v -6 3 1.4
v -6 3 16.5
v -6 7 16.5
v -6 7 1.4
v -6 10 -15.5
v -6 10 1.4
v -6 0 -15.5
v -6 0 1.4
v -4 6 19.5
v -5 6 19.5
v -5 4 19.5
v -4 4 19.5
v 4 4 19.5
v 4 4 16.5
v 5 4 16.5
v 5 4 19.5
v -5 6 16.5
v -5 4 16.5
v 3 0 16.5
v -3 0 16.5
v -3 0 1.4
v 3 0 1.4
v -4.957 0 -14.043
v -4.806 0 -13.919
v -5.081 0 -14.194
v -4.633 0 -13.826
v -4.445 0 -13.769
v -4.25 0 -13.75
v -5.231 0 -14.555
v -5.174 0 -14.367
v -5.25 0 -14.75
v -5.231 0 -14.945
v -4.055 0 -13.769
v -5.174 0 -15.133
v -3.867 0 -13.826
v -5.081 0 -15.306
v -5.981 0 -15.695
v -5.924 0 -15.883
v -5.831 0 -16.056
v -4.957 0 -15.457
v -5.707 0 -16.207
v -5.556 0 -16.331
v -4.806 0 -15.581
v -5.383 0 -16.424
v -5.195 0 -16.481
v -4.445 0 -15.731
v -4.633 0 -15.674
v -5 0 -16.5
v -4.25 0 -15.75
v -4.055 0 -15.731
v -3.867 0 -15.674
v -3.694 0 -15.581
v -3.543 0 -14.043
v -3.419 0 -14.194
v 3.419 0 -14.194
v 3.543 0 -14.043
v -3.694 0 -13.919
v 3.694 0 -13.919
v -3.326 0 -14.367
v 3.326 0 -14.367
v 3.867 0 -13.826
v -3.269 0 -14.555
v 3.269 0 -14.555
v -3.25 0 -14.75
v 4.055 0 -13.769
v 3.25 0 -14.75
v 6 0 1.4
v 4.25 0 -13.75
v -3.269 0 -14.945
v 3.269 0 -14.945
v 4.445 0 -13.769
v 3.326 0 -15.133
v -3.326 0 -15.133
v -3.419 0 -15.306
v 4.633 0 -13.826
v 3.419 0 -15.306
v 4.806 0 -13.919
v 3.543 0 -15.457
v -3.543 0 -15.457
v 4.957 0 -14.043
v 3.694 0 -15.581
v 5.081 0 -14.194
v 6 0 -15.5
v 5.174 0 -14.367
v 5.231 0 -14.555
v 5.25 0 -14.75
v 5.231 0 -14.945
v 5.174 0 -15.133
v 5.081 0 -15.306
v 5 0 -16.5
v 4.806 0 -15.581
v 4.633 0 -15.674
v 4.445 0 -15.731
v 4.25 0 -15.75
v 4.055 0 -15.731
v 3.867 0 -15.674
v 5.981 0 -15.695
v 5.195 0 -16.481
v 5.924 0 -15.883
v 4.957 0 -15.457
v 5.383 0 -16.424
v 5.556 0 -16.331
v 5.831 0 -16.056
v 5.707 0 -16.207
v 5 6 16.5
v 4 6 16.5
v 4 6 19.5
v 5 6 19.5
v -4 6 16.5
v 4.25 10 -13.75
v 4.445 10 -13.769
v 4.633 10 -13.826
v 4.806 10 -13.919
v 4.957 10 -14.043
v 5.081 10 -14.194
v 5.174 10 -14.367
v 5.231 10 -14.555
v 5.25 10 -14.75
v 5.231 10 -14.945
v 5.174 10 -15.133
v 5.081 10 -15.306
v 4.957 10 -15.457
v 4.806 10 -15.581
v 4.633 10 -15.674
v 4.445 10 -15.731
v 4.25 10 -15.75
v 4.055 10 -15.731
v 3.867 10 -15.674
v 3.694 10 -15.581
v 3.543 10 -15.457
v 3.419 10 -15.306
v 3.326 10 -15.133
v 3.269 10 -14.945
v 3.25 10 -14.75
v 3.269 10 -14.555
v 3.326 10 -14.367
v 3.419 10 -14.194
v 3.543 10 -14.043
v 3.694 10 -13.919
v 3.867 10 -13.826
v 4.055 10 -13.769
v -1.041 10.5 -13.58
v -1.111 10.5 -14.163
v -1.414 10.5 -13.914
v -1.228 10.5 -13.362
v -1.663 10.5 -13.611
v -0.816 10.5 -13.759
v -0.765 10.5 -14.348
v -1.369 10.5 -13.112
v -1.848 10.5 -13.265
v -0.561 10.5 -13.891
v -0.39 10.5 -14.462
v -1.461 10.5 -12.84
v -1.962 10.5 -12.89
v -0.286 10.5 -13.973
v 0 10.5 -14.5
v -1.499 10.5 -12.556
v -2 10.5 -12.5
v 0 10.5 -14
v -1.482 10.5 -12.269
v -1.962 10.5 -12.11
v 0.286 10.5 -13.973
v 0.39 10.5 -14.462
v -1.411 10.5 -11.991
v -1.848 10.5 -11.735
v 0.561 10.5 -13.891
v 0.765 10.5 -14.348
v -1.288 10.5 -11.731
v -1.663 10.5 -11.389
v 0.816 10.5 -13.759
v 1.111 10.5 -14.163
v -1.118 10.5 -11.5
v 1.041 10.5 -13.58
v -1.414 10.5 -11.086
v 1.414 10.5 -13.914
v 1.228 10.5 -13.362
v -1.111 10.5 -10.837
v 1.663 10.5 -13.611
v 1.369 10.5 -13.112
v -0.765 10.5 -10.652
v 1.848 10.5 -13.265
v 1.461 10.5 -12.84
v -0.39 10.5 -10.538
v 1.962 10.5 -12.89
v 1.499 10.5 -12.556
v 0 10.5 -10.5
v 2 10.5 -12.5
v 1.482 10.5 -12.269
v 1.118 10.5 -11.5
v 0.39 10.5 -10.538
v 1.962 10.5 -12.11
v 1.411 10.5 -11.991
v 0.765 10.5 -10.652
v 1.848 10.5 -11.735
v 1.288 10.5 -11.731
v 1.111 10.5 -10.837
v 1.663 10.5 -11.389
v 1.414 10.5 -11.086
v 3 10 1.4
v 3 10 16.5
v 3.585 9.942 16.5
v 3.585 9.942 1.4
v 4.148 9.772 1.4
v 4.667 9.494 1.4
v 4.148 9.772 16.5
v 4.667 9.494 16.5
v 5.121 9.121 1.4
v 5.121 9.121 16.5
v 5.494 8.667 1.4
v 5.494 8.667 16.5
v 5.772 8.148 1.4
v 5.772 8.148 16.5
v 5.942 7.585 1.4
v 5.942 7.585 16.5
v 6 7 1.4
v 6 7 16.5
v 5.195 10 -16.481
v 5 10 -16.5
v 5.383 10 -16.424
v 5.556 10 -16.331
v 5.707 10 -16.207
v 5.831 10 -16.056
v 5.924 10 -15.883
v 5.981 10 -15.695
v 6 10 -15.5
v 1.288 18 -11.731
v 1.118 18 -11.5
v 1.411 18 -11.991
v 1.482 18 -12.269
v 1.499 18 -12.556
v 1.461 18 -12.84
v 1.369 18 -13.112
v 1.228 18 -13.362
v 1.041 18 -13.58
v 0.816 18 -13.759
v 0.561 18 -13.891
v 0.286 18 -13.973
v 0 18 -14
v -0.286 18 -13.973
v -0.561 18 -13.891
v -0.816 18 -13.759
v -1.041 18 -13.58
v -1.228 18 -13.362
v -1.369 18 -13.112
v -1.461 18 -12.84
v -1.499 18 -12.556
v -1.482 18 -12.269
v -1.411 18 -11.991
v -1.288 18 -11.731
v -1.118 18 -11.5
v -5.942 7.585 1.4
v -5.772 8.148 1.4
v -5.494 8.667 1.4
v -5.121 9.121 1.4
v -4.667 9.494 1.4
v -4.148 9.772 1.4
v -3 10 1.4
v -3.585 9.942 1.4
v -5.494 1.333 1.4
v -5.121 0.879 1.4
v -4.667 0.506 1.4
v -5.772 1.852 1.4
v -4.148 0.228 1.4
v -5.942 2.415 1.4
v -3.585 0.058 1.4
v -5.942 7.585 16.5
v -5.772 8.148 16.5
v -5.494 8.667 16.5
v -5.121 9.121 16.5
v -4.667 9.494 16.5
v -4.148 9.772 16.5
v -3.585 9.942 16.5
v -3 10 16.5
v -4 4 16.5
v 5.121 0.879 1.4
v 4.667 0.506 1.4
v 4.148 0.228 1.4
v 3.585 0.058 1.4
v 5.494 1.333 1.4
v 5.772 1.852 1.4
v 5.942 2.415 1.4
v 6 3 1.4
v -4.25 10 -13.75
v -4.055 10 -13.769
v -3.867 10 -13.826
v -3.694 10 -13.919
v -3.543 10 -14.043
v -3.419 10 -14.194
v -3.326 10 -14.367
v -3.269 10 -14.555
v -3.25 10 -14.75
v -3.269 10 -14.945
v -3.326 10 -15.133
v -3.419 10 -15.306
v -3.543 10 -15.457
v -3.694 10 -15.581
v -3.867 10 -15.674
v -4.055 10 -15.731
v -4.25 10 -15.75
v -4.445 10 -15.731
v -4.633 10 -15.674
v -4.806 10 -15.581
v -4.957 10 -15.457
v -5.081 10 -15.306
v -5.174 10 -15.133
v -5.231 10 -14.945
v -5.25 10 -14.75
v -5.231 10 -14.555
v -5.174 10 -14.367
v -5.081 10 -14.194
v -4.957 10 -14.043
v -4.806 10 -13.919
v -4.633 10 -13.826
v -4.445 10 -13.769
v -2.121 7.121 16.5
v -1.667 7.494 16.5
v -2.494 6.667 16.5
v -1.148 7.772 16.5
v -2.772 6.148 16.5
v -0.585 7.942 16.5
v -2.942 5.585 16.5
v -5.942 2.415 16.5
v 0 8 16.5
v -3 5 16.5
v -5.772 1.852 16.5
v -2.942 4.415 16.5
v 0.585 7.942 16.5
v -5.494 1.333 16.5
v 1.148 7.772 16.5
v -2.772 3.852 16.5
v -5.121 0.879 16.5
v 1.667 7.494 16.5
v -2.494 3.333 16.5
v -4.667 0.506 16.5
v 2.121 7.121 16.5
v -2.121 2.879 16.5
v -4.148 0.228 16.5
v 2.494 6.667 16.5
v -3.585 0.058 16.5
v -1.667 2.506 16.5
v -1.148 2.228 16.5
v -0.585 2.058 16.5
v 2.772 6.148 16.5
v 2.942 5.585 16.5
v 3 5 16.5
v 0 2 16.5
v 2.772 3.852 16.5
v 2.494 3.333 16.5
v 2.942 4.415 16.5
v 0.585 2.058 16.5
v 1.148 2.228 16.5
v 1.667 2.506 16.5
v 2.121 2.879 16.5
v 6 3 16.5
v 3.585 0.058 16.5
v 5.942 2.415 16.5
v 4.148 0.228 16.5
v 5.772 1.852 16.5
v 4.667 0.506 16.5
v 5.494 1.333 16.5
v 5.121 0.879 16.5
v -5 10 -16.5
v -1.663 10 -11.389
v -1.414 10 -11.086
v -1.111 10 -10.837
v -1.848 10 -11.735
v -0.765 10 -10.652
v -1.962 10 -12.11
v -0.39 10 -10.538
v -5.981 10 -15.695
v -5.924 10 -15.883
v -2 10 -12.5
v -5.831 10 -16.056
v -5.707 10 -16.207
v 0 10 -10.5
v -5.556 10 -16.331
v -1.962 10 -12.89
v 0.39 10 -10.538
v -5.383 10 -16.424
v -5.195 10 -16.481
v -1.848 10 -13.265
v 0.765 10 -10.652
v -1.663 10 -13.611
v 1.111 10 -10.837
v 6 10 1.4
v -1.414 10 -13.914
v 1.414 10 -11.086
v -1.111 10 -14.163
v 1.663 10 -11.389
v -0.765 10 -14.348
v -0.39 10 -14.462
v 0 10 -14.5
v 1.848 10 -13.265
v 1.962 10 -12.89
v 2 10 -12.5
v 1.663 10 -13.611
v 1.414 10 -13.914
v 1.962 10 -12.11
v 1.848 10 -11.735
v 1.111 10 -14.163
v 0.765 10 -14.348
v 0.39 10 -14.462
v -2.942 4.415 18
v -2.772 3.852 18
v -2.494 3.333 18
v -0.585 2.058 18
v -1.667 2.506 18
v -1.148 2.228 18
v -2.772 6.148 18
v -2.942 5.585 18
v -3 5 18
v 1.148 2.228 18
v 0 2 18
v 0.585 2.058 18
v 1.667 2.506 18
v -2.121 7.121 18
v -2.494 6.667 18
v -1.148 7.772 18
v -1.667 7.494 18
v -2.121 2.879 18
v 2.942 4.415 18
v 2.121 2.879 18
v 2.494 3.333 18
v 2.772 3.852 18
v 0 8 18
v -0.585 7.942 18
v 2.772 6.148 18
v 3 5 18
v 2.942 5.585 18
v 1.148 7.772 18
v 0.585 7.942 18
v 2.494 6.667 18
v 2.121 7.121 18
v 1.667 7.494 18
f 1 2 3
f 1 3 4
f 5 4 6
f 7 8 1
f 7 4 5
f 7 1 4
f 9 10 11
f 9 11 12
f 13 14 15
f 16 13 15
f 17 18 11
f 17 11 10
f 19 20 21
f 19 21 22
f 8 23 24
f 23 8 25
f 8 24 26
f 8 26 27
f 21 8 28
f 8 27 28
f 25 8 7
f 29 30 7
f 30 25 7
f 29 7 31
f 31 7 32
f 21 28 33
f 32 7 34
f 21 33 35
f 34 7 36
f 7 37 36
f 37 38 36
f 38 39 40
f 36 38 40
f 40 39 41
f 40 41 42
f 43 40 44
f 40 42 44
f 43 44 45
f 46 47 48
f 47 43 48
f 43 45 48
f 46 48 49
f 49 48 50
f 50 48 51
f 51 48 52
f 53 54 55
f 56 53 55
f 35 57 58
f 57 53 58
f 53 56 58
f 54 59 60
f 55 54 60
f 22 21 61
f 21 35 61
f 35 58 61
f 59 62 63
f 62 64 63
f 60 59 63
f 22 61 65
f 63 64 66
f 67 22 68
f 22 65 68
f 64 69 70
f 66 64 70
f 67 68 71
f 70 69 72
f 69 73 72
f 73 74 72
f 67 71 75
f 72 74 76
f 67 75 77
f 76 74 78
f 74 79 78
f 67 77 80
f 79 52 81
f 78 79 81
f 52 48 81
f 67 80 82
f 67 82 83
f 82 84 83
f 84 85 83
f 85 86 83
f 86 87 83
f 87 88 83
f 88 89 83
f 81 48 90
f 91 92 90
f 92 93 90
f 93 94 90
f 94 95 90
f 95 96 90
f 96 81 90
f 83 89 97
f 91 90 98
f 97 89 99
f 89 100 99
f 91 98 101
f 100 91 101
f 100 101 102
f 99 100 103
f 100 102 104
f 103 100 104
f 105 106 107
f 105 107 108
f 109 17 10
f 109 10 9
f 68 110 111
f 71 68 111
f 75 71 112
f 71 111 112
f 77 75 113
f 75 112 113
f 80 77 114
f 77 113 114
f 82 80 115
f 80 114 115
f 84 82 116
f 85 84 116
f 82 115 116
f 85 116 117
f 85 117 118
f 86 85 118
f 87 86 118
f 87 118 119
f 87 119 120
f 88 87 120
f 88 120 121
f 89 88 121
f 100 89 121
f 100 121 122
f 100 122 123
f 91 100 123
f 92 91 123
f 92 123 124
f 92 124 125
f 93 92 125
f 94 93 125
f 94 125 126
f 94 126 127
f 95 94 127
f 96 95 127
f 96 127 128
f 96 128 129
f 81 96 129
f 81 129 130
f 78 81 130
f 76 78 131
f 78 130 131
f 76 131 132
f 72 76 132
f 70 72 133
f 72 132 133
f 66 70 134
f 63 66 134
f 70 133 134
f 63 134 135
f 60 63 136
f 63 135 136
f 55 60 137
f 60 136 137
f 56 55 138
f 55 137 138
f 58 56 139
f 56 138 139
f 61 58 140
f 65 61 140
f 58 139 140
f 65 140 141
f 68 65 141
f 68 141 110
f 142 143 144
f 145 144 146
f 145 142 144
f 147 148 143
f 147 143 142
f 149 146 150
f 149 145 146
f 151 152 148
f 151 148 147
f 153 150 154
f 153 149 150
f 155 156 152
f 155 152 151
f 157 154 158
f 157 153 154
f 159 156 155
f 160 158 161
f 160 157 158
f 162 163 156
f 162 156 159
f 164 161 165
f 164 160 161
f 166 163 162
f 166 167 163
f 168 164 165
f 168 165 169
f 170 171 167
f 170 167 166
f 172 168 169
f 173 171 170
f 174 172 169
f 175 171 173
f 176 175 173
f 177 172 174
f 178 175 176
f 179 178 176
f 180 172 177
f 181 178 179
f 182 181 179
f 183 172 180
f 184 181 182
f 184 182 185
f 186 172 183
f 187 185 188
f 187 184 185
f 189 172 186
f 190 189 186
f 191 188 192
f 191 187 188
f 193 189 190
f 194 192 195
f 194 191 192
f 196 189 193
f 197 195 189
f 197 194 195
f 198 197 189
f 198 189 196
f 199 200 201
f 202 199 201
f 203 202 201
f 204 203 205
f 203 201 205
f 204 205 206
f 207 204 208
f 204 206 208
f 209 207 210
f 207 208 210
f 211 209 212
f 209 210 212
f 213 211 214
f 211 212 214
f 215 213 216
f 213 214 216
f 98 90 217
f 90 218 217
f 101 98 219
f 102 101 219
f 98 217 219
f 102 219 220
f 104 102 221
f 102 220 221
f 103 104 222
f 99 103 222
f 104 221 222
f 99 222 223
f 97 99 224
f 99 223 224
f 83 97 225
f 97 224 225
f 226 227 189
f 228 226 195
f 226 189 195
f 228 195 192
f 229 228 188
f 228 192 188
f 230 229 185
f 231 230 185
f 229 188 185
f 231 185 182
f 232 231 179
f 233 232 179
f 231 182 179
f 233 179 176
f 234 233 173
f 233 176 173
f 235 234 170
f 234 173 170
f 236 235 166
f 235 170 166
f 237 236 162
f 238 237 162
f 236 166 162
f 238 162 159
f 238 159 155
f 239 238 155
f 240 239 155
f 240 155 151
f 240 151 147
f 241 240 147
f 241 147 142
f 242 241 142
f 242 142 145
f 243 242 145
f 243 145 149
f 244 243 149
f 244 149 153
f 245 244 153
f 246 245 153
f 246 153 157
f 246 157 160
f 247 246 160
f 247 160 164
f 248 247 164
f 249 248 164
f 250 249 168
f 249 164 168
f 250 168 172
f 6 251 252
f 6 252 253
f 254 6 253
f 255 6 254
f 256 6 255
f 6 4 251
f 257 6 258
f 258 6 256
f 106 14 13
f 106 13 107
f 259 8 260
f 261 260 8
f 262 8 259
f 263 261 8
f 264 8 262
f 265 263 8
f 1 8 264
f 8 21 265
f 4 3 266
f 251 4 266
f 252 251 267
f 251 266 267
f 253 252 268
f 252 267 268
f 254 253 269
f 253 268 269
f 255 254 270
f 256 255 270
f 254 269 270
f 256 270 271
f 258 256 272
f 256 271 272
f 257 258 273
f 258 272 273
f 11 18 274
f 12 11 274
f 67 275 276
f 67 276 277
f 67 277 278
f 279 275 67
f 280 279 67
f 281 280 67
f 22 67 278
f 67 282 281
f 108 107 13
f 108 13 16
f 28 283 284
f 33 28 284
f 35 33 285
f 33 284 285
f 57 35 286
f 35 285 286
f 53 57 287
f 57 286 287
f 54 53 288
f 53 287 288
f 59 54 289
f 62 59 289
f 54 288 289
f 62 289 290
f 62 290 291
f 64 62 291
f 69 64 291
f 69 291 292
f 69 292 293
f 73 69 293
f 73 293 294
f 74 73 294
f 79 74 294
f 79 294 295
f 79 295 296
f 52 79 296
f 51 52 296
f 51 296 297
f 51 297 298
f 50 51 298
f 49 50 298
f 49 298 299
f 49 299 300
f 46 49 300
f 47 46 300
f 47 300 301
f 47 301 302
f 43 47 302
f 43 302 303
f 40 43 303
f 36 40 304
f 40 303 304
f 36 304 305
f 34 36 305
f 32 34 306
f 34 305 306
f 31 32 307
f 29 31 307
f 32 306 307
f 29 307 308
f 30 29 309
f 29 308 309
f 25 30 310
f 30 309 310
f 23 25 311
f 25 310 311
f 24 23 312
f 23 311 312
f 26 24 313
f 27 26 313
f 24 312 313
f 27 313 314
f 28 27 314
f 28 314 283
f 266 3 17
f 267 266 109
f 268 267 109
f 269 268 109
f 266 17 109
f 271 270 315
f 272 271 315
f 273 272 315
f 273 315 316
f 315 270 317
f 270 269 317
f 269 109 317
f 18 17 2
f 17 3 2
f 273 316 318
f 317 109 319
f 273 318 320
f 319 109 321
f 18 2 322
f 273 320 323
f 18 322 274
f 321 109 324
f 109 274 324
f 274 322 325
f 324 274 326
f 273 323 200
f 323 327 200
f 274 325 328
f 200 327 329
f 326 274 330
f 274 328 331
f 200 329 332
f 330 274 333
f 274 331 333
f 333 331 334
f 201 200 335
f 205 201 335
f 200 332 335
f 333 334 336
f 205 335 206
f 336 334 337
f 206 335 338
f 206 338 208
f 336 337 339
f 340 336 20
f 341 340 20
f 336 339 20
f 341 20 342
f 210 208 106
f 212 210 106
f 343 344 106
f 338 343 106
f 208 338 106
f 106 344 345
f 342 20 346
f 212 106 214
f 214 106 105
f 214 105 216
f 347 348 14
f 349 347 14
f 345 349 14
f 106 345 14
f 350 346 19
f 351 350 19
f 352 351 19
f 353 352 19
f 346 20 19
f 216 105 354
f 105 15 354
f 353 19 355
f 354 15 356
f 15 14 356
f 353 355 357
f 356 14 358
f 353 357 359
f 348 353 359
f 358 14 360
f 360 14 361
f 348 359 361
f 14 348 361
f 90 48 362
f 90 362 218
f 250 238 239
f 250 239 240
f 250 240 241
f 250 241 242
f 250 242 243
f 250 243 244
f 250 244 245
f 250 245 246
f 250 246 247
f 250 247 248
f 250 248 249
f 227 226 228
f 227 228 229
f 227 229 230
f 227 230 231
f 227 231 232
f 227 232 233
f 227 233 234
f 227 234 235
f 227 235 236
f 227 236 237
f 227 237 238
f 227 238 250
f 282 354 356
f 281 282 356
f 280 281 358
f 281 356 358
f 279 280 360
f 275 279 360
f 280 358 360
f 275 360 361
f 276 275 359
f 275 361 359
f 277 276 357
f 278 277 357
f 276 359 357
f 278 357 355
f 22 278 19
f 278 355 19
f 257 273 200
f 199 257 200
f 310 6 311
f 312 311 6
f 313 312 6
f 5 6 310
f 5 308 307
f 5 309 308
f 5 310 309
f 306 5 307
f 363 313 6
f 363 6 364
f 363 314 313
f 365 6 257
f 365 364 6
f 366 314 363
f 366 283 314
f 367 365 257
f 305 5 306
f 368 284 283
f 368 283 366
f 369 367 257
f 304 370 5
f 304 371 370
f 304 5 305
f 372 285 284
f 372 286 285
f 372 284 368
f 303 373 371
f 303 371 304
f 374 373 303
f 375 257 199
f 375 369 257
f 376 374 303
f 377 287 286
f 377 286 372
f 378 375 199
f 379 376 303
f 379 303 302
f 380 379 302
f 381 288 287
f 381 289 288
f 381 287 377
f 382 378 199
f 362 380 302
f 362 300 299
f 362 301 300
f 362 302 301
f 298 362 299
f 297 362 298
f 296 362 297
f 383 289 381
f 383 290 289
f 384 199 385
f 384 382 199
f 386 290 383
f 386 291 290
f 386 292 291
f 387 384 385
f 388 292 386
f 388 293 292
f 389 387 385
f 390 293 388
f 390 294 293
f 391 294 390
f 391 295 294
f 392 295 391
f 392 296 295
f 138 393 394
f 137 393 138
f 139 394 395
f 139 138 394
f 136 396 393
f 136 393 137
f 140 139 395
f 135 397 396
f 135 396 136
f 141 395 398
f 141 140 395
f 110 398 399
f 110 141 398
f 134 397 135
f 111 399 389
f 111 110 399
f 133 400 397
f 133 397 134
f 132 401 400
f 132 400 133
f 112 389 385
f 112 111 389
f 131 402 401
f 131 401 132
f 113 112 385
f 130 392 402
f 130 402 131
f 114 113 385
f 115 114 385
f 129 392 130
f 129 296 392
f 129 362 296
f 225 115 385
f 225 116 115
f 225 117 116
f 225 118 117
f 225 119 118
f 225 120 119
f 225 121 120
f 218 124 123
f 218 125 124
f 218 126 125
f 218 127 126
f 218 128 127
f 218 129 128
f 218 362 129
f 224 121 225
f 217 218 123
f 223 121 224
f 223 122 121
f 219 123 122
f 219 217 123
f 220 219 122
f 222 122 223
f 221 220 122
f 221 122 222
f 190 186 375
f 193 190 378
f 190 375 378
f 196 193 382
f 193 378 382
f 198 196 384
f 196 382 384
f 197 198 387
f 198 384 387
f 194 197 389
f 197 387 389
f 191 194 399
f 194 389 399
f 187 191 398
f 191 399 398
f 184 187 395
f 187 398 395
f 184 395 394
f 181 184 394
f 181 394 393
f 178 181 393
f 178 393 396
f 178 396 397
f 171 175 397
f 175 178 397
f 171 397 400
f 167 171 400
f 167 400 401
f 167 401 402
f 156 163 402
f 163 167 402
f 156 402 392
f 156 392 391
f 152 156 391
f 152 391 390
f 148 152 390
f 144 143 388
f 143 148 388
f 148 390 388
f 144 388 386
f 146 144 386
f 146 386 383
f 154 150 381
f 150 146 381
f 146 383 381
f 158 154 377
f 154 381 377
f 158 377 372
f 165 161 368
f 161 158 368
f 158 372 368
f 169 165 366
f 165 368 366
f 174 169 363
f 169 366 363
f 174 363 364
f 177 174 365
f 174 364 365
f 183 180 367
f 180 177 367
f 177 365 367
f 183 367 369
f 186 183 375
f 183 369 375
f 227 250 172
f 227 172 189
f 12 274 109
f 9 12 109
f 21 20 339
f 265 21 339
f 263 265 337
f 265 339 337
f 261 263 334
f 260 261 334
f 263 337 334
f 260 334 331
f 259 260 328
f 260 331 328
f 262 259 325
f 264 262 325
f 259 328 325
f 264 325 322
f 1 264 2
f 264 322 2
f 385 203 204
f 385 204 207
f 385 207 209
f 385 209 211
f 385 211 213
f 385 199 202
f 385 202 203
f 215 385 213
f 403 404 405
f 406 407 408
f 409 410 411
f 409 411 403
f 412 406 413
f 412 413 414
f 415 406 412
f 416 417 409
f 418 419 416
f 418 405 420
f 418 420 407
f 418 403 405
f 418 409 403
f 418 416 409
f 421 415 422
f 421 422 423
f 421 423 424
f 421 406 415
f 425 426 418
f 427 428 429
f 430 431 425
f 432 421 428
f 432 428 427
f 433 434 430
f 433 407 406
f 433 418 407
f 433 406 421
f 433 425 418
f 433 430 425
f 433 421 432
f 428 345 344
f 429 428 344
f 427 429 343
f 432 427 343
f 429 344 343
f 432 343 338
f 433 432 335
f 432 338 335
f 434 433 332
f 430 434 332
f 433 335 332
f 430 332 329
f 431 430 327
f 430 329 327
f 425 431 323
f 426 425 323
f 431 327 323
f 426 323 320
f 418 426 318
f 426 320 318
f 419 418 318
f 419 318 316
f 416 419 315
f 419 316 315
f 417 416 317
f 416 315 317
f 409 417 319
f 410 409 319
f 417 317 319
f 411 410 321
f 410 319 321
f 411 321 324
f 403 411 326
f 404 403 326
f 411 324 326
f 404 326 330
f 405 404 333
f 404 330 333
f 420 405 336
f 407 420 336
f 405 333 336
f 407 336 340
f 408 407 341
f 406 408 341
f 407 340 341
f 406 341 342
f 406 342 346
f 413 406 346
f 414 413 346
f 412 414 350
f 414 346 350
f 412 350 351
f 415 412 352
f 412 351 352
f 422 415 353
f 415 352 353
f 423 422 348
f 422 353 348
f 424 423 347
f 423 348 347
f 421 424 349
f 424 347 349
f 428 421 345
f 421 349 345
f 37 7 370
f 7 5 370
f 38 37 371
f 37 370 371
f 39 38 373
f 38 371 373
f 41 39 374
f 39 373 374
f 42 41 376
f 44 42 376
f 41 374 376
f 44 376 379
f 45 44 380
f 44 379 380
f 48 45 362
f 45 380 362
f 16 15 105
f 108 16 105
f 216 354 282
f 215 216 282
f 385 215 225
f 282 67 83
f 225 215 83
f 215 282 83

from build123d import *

# Parameters (mm, degrees)
SKETCH_1_W          = 12
SKETCH_1_H          = 33
EXTRUDE_1_DEPTH     = 10
SKETCH_3_OUTSIDE_W  = 21.302
SKETCH_3_OUTSIDE_H  = 19.302
CUT_EXTRUDE_1_DEPTH = 15.1
SKETCH_4_R          = 3
EXTRUDE_2_DEPTH     = 1.5
SKETCH_5_W          = 1
SKETCH_5_H          = 2
EXTRUDE_3_DEPTH     = 3
SKETCH_6_R          = 2
EXTRUDE_4_DEPTH     = 0.5
SKETCH_7_R          = 1.5
EXTRUDE_5_DEPTH     = 7.5
SKETCH_8_W          = 5.870249933
SKETCH_8_H          = 2.720447988
CUT_EXTRUDE_2_DEPTH = 7.5
FILLET_1_R          = 1
SKETCH_9_R          = 1
CUT_EXTRUDE_3_DEPTH = 23.721135535


with BuildPart() as part:
    # 草图1 → 凸台-拉伸1 (new body)
    with BuildSketch(Plane(origin=(0, 0, 0), x_dir=(1, 0, 0), z_dir=(0, 1, 0))):
        Rectangle(SKETCH_1_W, SKETCH_1_H)
    extrude(amount=EXTRUDE_1_DEPTH)

    # 草图3 outside → 切除-拉伸1 (cut)
    with BuildSketch(Plane.XY.offset(16.5)):
        with Locations((0, 5)):
            Rectangle(SKETCH_3_OUTSIDE_W, SKETCH_3_OUTSIDE_H)
        with BuildLine():
            Line((-3, 10), (3, 10))
            ThreePointArc((3, 10), (5.121320344, 9.121320344), (6, 7))
            Line((6, 7), (6, 3))
            ThreePointArc((6, 3), (5.121320344, 0.878679656), (3, 0))
            Line((3, 0), (-3, 0))
            ThreePointArc((-3, 0), (-5.121320344, 0.878679656), (-6, 3))
            Line((-6, 3), (-6, 7))
            ThreePointArc((-6, 7), (-5.121320344, 9.121320344), (-3, 10))
        make_face(mode=Mode.SUBTRACT)
    extrude(amount=-CUT_EXTRUDE_1_DEPTH, mode=Mode.SUBTRACT)

    # 草图4 → 凸台-拉伸2 (add)
    with BuildSketch(Plane.XY.offset(16.5)):
        with Locations((0, 5)):
            Circle(SKETCH_4_R)
    extrude(amount=EXTRUDE_2_DEPTH)

    # 草图5 → 凸台-拉伸3 (add)
    with BuildSketch(Plane.XY.offset(16.5)):
        with Locations((4.5, 5)):
            Rectangle(SKETCH_5_W, SKETCH_5_H)
        with Locations((-4.5, 5)):
            Rectangle(SKETCH_5_W, SKETCH_5_H)
    extrude(amount=EXTRUDE_3_DEPTH)

    # 草图6 → 凸台-拉伸4 (add)
    with BuildSketch(Plane(origin=(0, 10, 0), x_dir=(1, 0, 0), z_dir=(0, 1, 0))):
        with Locations(Location((0, 12.5, 0), (0, 0, 270))):
            Circle(SKETCH_6_R)
    extrude(amount=EXTRUDE_4_DEPTH)

    # 草图7 → 凸台-拉伸5 (add)
    with BuildSketch(Plane(origin=(0, 10.5, 0), x_dir=(1, 0, 0), z_dir=(0, 1, 0))):
        with Locations(Location((0, 12.5, 0), (0, 0, 270))):
            Circle(SKETCH_7_R)
    extrude(amount=EXTRUDE_5_DEPTH)

    # 草图8 → 切除-拉伸2 (cut)
    with BuildSketch(Plane(origin=(0, 18, 0), x_dir=(1, 0, 0), z_dir=(0, 1, 0))):
        with Locations((0.402921065, 10.139776006)):
            Rectangle(SKETCH_8_W, SKETCH_8_H)
    extrude(amount=-CUT_EXTRUDE_2_DEPTH, mode=Mode.SUBTRACT)

    # 圆角1
    fillet_1_edges = [part.edges().sort_by_distance(p)[0] for p in [
        (-6, 5, -16.5),
        (6, 5, -16.5),
    ]]
    fillet(fillet_1_edges, radius=FILLET_1_R)

    # 草图9 → 切除-拉伸3 (cut, through all)
    with BuildSketch(Plane(origin=(0, 10, 0), x_dir=(1, 0, 0), z_dir=(0, 1, 0))):
        with Locations(Location((-4.25, 14.75, 0), (0, 0, 270))):
            Circle(SKETCH_9_R)
        with Locations(Location((4.25, 14.75, 0), (0, 0, 270))):
            Circle(SKETCH_9_R)
    extrude(amount=-CUT_EXTRUDE_3_DEPTH, mode=Mode.SUBTRACT)


solid = part.part
